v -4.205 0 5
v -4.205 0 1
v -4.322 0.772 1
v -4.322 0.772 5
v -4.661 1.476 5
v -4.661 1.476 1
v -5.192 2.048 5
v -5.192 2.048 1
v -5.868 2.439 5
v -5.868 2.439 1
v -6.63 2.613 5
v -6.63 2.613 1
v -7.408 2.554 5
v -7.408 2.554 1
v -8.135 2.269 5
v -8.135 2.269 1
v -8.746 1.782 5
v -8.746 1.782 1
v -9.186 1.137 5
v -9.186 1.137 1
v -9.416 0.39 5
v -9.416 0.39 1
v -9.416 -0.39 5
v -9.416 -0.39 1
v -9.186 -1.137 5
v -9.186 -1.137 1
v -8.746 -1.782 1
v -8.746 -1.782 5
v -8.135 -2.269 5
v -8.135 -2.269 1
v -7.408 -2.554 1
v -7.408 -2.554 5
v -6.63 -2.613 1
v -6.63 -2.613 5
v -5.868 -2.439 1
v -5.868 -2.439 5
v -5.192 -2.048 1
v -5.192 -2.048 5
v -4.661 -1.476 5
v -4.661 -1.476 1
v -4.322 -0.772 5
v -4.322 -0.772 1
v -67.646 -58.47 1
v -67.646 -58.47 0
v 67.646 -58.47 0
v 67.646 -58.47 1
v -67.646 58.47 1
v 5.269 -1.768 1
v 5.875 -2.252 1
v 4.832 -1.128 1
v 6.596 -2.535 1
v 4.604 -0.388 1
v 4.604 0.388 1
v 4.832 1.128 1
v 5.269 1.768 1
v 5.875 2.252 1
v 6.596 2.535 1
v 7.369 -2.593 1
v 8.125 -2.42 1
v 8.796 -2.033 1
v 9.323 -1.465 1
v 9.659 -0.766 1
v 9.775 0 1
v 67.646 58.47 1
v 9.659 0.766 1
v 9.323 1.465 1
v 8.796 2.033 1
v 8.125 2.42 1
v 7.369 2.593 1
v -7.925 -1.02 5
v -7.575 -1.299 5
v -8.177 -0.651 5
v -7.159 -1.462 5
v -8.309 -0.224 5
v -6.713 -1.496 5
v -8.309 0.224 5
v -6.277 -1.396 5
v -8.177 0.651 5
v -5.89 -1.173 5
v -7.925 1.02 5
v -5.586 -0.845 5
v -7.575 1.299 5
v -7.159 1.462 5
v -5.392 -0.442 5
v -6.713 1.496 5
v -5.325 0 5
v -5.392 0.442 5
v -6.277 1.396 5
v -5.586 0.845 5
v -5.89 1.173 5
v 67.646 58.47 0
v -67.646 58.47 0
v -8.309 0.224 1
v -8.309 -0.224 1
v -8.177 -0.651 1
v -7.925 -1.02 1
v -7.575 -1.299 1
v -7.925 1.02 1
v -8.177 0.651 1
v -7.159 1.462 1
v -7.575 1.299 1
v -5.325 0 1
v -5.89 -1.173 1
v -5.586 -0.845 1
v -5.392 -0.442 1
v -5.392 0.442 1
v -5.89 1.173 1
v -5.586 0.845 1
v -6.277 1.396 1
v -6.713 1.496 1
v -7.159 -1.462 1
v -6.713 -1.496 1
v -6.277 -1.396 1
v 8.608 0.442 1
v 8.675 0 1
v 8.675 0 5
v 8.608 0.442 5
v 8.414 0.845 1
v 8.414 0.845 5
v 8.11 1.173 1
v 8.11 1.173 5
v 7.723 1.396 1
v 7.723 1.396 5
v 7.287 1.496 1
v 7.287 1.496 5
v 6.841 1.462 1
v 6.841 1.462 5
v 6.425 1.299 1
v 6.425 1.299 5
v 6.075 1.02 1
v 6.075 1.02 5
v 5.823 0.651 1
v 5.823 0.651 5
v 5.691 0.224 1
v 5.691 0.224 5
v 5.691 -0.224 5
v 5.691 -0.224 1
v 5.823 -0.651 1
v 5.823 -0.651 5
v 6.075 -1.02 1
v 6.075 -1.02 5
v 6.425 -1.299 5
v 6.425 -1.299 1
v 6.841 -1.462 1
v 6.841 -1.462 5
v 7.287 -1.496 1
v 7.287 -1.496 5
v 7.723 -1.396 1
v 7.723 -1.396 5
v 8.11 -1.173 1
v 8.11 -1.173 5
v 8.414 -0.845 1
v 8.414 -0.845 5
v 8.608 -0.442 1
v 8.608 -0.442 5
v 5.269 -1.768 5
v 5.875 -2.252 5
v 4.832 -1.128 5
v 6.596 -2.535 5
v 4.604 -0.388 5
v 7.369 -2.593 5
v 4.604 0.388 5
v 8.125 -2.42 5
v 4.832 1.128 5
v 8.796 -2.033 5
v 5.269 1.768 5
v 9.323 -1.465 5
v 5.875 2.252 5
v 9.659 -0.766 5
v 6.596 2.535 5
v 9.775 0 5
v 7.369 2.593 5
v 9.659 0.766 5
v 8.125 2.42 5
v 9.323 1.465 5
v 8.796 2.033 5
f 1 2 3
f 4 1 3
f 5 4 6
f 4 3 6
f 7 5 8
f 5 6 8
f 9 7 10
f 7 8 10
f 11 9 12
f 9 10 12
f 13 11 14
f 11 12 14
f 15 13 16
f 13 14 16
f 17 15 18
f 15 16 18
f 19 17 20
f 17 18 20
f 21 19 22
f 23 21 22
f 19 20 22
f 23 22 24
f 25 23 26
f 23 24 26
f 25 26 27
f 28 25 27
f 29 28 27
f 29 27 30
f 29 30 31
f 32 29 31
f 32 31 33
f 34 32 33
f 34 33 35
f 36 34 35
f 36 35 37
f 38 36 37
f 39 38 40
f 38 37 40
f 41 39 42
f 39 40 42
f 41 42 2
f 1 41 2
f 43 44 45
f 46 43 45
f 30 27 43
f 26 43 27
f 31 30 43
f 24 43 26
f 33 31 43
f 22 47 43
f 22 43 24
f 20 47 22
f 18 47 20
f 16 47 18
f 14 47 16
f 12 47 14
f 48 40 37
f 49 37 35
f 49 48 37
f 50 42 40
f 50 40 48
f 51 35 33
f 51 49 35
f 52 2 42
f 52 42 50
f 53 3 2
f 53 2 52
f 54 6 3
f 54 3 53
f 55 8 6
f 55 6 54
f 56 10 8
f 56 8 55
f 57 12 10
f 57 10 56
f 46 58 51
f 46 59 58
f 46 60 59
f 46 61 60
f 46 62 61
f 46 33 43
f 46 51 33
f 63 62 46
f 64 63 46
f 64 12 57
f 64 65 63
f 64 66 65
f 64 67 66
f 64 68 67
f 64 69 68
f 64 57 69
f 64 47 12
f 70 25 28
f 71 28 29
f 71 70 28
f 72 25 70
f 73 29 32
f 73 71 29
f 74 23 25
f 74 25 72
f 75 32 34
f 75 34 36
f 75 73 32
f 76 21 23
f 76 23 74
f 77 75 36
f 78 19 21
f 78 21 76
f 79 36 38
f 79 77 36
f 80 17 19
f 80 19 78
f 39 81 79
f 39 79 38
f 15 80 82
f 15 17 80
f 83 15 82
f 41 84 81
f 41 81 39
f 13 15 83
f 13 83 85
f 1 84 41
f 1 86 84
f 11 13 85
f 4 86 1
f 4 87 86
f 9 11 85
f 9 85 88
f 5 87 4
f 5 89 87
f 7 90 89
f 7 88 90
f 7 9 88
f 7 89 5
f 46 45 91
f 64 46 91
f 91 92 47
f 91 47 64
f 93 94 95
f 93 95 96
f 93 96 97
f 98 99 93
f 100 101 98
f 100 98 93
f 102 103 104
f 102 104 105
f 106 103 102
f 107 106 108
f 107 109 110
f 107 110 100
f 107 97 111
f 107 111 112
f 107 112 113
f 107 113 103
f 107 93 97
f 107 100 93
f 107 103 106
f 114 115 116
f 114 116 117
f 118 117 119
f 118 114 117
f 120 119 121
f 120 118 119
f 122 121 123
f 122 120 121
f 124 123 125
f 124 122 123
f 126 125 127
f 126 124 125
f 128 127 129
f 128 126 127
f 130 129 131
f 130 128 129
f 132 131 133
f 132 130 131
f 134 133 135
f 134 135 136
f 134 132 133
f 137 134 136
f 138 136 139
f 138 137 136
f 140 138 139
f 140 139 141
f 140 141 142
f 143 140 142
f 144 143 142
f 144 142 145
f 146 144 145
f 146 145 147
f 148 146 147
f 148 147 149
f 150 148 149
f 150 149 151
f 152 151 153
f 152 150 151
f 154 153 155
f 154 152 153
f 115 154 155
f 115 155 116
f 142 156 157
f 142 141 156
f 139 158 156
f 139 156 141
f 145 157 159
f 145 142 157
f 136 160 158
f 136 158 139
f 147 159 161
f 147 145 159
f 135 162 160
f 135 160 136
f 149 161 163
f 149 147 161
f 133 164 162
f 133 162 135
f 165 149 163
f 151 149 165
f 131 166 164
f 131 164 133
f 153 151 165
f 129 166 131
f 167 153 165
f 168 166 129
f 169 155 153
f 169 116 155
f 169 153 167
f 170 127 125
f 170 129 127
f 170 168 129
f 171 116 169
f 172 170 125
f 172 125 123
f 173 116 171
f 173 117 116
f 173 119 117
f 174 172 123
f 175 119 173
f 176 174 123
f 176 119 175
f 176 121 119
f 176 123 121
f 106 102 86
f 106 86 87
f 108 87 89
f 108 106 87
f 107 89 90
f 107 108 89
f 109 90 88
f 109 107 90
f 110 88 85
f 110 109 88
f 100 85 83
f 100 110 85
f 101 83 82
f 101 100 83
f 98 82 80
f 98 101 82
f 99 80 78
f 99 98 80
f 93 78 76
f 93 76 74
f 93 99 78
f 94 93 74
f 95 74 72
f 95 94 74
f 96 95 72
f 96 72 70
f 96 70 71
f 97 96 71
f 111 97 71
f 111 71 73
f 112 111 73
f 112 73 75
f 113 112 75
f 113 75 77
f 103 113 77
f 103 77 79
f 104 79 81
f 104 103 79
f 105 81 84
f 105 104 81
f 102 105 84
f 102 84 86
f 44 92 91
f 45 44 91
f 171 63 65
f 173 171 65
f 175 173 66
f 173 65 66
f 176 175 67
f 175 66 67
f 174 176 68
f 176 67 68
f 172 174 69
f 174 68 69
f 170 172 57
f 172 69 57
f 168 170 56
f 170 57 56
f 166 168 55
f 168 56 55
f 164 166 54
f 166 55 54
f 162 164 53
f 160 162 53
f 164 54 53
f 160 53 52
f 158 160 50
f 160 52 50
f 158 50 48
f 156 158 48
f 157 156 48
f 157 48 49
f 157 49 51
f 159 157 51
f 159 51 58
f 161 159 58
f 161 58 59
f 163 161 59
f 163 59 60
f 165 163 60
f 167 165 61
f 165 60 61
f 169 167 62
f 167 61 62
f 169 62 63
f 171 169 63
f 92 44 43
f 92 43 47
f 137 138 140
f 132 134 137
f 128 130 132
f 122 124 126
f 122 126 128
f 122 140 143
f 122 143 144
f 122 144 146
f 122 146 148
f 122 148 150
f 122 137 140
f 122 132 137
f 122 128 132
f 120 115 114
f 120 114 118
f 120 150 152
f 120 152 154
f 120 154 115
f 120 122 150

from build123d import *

# Parameters (mm, degrees)
F0_W     = 135.291382
F0_H     = 116.93953
F1_DEPTH = 1
F2_R     = 2.62
F2_R_2   = 1.5
F2_R_3   = 2.6
F3_DEPTH = 4


with BuildPart() as f1:
    # F0 (on Top) → F1 (new body)
    with BuildSketch(Plane.XY):
        Rectangle(F0_W, F0_H)
    extrude(amount=F1_DEPTH)

    # F2 (on face) → F3 (join)
    with BuildSketch(Plane.XY.offset(1)):
        with Locations((-6.825348, 0)):
            Circle(F2_R)
        with Locations((-6.825348, 0)):
            Circle(F2_R_2, mode=Mode.SUBTRACT)
        with Locations((7.174652, 0)):
            Circle(F2_R_3)
        with Locations((7.174652, 0)):
            Circle(F2_R_2, mode=Mode.SUBTRACT)
    extrude(amount=F3_DEPTH)


solid = f1.part
